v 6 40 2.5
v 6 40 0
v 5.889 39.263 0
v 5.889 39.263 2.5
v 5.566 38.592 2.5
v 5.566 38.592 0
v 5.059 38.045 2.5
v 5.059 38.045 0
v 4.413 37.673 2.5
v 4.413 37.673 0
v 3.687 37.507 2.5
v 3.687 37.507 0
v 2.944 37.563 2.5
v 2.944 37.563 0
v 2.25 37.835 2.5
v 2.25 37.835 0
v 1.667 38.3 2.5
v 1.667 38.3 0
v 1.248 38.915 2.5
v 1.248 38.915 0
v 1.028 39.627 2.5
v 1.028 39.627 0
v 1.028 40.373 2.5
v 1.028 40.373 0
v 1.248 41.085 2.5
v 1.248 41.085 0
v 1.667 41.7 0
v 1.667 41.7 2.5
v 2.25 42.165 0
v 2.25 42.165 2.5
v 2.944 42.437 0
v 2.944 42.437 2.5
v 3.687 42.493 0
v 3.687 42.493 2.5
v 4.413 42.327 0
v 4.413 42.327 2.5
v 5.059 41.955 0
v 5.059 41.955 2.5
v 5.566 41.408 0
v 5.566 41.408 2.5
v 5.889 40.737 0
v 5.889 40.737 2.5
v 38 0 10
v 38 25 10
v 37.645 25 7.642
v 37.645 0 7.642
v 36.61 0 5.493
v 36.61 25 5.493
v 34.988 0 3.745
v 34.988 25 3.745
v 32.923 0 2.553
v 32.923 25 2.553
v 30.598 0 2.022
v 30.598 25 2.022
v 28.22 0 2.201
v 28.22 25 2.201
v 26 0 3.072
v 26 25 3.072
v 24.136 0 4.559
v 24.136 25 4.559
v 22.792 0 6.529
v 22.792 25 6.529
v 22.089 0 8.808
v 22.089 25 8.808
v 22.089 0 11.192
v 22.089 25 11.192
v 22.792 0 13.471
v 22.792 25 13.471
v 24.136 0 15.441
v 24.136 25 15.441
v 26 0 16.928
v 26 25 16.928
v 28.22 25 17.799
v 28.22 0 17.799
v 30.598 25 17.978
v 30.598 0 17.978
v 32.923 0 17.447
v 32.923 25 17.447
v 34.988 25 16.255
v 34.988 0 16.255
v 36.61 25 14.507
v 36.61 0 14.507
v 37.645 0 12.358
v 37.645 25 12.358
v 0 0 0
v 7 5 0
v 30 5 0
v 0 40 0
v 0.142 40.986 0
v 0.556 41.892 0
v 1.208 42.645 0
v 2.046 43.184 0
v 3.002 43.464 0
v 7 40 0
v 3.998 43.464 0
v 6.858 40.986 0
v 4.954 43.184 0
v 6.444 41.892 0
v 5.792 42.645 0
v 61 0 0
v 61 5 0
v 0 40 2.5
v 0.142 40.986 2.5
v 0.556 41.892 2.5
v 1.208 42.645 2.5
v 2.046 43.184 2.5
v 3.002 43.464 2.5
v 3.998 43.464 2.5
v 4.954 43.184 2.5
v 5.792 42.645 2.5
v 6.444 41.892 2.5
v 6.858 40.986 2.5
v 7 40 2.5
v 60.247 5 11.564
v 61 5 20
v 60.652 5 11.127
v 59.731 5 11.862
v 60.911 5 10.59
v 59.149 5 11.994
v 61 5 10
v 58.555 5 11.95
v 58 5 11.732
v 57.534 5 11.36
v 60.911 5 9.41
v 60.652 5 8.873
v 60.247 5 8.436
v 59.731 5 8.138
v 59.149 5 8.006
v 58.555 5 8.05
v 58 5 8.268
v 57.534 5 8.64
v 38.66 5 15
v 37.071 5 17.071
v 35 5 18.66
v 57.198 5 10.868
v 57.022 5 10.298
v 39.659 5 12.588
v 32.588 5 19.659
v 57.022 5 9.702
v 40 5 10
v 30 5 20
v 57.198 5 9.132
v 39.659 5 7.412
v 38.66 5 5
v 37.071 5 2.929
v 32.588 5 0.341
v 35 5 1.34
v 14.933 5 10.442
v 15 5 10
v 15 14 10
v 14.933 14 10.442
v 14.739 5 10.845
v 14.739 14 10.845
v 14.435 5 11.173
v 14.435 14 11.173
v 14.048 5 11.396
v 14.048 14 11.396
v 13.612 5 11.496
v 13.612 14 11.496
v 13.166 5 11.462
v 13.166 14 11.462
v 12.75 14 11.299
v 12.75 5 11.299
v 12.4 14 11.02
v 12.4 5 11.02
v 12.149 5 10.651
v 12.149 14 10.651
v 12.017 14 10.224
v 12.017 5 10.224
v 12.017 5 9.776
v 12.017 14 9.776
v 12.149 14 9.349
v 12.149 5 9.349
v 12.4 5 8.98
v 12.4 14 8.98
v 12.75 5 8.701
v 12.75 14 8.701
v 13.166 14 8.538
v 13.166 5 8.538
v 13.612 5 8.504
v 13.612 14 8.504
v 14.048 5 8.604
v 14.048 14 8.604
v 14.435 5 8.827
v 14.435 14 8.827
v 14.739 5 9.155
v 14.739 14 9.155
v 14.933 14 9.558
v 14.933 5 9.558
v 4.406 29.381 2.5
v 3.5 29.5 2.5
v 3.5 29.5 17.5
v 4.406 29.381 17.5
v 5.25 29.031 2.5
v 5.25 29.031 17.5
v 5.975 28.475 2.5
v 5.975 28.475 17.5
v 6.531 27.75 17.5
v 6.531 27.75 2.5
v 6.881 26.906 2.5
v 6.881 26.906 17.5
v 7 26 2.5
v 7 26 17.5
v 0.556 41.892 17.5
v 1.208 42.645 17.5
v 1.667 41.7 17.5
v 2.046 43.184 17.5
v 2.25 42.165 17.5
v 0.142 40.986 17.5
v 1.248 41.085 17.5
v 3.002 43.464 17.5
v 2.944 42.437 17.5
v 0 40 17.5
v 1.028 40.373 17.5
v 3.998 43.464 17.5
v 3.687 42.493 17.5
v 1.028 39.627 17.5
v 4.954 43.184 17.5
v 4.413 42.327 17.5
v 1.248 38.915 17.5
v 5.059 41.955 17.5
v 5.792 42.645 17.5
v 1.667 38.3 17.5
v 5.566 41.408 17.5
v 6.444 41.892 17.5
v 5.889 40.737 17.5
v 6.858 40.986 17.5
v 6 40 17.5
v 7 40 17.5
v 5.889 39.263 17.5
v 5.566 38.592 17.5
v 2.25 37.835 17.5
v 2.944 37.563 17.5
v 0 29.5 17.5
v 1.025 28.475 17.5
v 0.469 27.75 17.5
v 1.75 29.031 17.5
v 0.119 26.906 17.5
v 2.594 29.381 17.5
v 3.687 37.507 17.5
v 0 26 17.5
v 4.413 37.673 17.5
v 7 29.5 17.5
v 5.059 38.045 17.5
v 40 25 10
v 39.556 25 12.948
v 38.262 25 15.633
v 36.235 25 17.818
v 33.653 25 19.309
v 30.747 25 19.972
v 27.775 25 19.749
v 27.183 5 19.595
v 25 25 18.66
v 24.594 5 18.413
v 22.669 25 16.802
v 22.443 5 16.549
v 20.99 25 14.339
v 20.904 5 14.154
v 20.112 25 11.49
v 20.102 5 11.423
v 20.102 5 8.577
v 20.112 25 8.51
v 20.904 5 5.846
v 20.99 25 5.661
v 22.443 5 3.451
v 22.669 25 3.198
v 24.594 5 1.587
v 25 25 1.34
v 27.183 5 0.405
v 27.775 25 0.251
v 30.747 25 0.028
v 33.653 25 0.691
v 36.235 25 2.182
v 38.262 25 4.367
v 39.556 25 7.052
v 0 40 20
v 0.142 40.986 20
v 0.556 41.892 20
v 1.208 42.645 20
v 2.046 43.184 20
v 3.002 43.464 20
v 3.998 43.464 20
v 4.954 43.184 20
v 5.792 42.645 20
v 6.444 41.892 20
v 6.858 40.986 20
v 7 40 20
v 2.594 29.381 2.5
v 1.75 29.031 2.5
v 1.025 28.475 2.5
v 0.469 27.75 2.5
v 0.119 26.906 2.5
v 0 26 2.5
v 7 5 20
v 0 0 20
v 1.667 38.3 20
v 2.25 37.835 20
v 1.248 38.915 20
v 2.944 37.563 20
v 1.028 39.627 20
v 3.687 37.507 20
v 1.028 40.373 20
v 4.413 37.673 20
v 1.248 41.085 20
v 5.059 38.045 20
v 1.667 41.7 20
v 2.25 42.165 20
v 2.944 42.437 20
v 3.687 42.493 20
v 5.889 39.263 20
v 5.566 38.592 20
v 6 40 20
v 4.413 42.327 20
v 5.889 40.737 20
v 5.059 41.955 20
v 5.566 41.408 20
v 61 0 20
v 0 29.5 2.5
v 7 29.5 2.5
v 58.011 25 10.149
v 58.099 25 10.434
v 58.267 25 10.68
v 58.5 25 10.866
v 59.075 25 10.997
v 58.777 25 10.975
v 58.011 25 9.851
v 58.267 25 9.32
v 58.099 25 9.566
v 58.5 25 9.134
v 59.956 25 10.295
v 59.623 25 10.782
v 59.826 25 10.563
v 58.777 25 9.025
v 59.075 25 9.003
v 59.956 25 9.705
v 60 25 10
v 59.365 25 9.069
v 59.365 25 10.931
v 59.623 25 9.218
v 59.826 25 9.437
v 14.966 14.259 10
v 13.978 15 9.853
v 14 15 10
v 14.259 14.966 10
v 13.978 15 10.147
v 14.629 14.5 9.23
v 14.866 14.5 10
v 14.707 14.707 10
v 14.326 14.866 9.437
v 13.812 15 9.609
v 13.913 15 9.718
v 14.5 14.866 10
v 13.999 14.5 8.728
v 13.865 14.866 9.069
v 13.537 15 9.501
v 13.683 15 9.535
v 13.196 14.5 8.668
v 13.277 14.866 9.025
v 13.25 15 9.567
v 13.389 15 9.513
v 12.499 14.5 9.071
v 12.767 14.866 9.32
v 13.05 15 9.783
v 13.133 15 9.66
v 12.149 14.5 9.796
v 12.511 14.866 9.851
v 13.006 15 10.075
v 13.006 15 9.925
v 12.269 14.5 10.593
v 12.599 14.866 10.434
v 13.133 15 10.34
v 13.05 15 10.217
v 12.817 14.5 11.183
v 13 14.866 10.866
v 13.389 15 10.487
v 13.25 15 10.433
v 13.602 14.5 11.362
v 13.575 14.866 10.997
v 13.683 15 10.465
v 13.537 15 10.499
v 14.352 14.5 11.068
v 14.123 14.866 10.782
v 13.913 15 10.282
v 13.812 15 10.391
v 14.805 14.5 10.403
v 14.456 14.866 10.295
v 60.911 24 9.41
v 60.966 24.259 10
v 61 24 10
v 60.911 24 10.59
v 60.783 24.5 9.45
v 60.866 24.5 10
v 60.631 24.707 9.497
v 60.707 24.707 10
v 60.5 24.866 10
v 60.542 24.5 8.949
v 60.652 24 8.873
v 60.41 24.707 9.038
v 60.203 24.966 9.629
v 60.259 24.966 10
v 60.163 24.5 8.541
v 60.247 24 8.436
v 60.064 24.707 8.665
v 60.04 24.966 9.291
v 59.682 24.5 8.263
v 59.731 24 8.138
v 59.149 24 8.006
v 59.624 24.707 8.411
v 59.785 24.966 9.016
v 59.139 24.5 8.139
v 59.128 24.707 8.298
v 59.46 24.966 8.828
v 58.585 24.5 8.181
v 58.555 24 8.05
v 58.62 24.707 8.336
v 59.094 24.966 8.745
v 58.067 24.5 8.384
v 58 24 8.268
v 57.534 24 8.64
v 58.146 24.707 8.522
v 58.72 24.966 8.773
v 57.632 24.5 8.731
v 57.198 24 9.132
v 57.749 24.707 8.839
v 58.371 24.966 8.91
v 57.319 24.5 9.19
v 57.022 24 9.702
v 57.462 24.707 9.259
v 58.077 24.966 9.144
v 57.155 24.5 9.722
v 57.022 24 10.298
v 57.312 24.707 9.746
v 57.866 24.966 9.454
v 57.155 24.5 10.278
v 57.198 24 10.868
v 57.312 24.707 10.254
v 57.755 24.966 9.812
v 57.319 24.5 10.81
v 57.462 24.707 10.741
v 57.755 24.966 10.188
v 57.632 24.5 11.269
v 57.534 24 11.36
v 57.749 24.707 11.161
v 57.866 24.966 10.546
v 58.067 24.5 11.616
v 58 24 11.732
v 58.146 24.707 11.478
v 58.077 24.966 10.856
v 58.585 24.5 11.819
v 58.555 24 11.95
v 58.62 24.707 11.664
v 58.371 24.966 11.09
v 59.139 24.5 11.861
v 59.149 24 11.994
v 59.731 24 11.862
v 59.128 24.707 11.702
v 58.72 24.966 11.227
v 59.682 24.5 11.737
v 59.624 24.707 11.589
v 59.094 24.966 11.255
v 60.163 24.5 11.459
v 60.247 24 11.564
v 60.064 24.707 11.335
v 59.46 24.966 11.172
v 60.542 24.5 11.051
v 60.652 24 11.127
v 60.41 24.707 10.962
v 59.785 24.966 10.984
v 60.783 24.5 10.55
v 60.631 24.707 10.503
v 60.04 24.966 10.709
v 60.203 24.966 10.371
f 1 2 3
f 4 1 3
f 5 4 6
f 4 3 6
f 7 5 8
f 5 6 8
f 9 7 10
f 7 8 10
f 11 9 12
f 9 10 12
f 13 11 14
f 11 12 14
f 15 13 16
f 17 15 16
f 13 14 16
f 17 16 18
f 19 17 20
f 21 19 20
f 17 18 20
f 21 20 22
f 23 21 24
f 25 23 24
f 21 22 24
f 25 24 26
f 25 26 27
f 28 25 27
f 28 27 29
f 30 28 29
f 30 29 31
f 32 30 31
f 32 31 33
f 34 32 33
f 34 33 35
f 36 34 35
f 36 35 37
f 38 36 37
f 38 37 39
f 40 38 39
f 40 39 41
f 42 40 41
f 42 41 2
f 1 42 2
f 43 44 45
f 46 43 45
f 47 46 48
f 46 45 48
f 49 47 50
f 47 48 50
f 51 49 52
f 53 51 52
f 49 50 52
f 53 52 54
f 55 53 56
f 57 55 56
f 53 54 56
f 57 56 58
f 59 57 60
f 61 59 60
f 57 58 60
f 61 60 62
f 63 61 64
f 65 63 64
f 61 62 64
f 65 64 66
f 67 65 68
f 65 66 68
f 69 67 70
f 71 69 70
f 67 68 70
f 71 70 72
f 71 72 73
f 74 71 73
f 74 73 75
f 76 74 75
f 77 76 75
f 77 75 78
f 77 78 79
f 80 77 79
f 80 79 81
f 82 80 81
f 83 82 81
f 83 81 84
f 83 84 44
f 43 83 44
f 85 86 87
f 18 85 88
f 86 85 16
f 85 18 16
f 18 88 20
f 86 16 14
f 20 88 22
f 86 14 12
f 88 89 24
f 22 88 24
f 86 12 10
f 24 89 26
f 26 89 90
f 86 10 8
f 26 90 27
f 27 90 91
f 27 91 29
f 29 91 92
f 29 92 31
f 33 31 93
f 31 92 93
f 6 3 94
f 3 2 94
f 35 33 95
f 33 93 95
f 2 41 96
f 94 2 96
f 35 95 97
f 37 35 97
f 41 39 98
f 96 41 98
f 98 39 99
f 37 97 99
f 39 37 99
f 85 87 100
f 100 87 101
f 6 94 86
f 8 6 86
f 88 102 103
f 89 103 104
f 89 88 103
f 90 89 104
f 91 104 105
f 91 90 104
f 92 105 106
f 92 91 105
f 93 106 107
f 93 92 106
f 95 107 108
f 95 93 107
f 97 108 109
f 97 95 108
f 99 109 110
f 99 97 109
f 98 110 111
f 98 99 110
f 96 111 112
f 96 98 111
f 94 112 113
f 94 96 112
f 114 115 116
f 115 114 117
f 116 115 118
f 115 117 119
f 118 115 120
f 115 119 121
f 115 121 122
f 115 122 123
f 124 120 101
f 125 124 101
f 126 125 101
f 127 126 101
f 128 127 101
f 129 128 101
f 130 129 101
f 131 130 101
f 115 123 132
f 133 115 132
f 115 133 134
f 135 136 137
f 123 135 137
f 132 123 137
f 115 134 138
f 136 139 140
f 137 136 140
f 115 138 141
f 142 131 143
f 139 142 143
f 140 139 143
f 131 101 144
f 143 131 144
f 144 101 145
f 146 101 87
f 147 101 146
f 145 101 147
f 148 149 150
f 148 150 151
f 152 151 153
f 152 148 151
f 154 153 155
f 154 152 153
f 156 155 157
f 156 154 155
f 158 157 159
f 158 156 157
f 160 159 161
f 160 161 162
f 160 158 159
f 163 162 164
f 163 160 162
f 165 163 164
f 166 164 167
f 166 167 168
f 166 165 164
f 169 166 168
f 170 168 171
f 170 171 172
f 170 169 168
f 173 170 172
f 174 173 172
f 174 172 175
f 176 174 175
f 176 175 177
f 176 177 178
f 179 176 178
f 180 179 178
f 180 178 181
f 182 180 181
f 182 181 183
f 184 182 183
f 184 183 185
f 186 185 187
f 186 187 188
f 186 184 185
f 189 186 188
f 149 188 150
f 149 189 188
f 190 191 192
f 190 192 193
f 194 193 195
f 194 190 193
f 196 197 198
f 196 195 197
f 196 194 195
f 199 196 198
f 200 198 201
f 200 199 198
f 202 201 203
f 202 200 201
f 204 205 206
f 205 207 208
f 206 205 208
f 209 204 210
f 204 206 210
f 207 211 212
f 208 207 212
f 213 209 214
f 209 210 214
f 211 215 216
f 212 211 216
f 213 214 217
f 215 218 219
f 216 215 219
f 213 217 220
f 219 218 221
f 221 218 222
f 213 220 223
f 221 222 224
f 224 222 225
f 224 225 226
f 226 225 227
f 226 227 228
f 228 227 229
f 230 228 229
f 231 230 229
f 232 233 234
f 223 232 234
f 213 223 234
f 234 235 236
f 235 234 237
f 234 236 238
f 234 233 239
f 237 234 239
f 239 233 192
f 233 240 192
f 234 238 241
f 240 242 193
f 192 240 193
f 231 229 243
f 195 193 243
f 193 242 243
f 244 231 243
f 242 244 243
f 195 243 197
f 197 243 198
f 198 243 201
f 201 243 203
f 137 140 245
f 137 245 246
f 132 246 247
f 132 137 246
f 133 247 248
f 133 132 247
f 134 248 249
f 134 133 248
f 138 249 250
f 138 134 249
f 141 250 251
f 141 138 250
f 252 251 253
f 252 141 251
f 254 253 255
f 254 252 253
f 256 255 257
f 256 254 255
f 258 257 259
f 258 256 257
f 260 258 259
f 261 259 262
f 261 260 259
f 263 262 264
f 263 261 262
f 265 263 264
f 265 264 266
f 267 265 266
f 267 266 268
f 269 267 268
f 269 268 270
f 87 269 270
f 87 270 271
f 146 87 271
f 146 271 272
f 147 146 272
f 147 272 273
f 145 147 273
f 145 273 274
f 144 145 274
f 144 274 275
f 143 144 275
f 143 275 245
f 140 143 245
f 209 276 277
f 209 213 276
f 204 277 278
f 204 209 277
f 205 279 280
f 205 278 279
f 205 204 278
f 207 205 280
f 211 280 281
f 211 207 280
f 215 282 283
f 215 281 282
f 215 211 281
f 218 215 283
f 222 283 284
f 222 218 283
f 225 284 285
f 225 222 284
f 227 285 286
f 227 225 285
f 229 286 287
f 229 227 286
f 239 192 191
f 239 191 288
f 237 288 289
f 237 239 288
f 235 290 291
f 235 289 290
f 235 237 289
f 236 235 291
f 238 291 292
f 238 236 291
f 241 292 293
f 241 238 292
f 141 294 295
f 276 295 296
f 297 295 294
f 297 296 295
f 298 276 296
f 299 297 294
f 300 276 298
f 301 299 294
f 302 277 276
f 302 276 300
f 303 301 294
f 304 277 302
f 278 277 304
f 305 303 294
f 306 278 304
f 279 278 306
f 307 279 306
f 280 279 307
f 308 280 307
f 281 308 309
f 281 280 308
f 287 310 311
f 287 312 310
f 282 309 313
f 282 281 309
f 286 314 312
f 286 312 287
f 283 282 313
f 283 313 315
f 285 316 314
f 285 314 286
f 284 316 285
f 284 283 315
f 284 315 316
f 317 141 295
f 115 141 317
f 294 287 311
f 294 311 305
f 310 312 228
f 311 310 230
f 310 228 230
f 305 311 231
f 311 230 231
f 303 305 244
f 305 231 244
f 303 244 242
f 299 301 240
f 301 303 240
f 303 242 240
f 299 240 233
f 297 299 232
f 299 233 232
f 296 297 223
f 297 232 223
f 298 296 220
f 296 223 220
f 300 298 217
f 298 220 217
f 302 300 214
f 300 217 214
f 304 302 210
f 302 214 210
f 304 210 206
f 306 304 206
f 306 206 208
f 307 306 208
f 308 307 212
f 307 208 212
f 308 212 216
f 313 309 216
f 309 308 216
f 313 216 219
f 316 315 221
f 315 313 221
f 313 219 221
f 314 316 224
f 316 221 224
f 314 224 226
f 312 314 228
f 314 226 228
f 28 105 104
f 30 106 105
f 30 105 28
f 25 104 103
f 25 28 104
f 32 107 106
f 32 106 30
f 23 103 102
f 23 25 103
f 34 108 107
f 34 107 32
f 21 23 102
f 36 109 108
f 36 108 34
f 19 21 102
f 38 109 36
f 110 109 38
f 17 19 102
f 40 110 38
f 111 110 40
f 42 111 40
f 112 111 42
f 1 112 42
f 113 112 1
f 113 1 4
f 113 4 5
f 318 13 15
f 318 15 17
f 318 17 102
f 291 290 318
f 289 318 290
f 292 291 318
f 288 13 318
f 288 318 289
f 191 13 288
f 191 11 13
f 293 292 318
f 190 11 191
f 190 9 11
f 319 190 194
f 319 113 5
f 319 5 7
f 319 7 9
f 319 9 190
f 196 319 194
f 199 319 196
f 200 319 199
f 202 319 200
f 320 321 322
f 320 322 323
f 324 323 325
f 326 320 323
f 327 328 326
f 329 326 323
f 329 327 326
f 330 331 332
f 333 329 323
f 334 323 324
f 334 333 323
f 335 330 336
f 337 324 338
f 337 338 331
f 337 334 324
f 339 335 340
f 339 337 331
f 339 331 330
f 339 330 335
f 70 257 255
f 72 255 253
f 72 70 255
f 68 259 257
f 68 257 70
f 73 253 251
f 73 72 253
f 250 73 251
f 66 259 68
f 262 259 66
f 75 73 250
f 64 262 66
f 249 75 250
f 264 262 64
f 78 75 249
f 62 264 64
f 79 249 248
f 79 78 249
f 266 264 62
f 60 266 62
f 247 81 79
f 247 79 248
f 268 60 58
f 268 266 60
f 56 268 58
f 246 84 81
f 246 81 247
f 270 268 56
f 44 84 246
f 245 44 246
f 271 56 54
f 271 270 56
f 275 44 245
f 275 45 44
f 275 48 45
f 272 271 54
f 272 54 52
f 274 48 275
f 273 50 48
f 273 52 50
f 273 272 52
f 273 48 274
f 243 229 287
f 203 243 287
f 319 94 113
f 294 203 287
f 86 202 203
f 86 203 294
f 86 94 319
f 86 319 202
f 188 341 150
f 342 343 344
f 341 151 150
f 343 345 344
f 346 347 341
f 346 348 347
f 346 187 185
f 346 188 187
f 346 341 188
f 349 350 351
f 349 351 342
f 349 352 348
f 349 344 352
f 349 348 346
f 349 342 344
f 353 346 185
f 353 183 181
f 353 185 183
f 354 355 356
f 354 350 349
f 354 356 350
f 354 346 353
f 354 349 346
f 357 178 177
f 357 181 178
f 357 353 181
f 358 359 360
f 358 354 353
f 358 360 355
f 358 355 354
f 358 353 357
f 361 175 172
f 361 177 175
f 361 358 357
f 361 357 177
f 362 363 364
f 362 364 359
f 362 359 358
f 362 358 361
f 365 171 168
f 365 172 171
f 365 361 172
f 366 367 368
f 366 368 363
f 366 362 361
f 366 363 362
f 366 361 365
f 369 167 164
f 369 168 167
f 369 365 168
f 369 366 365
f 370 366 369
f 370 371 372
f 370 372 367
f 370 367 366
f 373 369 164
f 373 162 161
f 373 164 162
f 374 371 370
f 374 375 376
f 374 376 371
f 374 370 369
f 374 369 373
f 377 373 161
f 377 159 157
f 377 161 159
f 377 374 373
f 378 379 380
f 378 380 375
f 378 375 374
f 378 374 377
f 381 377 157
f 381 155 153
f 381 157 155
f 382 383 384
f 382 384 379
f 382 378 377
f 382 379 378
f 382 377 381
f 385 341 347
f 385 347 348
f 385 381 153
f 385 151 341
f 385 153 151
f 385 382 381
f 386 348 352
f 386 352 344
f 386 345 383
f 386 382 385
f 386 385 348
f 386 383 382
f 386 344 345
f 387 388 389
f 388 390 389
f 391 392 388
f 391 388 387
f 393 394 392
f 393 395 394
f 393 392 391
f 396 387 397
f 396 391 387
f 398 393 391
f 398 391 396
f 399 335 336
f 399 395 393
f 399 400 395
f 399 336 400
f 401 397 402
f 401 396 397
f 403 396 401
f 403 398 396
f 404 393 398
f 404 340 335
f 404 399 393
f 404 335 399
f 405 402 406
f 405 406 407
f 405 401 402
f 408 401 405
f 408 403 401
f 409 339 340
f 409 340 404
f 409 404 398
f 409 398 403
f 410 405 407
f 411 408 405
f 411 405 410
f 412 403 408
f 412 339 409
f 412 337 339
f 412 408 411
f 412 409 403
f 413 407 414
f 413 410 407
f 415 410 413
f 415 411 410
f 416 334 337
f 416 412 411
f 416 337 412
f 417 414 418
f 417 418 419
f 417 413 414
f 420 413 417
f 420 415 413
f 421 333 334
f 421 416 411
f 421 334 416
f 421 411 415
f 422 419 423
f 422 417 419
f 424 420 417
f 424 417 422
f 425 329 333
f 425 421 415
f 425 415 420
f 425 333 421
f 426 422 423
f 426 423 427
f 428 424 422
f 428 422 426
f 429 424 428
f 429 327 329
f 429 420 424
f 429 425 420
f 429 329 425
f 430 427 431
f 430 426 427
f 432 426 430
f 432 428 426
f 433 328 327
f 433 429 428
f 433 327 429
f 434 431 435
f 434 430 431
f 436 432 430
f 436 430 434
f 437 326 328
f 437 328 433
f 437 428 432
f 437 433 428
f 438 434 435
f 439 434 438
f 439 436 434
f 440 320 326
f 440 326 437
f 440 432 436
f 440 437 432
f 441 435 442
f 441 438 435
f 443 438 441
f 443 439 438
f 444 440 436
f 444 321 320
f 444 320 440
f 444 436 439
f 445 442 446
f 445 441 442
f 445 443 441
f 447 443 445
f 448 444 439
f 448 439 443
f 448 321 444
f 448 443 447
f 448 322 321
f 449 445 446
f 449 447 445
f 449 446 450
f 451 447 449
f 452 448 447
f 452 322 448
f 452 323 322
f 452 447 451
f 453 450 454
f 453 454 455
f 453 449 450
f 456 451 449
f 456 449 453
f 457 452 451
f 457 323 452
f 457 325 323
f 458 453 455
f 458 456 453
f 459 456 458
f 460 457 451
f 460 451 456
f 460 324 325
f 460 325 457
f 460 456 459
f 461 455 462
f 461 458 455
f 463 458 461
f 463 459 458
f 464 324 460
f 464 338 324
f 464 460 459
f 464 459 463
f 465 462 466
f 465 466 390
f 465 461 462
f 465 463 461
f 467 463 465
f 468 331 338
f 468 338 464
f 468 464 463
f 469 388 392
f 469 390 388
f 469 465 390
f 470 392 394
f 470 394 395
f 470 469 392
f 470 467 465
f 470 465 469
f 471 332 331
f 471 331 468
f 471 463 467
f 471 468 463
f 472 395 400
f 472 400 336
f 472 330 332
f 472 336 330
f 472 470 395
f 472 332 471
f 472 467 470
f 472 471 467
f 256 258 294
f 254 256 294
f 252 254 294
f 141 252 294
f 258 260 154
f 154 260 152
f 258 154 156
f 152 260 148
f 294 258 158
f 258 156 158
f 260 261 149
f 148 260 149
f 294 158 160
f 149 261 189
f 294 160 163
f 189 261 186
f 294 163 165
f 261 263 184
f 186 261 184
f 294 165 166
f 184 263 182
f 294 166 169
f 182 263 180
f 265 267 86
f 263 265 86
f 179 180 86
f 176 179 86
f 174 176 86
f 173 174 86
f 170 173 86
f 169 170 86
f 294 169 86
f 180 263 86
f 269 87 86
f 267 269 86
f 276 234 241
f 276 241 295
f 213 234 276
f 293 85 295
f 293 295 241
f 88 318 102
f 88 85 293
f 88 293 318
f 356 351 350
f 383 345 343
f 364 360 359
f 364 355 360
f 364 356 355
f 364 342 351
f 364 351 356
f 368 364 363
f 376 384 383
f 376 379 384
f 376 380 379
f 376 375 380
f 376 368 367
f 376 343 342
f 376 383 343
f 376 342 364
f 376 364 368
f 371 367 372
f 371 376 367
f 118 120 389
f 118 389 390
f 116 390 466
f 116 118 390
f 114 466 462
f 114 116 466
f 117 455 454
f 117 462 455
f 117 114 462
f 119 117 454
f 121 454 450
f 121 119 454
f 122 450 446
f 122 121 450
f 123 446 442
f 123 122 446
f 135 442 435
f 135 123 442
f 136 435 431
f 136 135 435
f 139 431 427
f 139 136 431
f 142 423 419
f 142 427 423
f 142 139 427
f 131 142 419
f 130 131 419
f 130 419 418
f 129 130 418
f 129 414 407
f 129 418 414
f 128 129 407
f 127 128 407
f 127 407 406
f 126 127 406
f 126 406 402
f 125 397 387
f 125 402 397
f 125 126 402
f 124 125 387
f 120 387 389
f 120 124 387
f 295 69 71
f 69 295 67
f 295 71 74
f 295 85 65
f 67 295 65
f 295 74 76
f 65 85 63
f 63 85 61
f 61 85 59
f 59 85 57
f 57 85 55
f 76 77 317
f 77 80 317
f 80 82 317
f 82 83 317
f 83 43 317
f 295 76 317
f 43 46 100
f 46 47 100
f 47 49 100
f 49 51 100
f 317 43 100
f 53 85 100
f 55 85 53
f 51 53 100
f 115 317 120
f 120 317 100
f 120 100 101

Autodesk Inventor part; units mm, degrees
ref_plane "YZ Plane" through (0, 0, 0) normal (1, 0, 0) x (0, 1, 0)
ref_plane "XZ Plane" through (0, 0, 0) normal (0, 1, 0) x (-1, 0, 0)
ref_plane "XY Plane" through (0, 0, 0) normal (0, 0, 1) x (1, 0, 0)
sketch "Sketch1" plane through (0, 0, 0) normal (0, 0, 1) x (1, 0, 0)
  line L0 (0, 0) -> (0, 40)
  line L1 (0, 0) -> (61, 0)
  line L2 (61, 0) -> (61, 5)
  line L3 (61, 5) -> (7, 5)
  arc A0 (7, 40) -> (0, 40) centre (3.5, 40) ccw
  line L4 (7, 40) -> (7, 5)
  circle A1 centre (3.5, 40) radius 2.5
  dimension "d0" = 40
  dimension "d2" = 5
  dimension "d6" = 3.5
  dimension "d7" = 5
  dimension "d8" = 7
  dimension "d9" = 54
  dimension "d46" = 61
extrude "Extrusion1" add sketch "Sketch1" along normal blind 20
sketch "Sketch2" plane through (7, 5, 0) normal (0, 1, 0) x (1, 0, 0)
  circle A0 centre (6.5, -10) radius 1.5
  line L0 (0, 0) -> (0, -20) projected
  circle A1 centre (23, -10) radius 10
  line L1 (0, 0) -> (54, 0) projected
  circle A2 centre (52, -10) radius 2
  line L2 (54, 0) -> (54, -20) projected
  line L3 (-1, 0) -> (-1, -20) projected
  line L4 (-6, 0) -> (-6, -20) projected
  line L5 (-7, -10) -> (-7, -6.6929)
  point P0 (-7, 0)
  dimension "d12" = 3
  dimension "d13" = 6.5
  dimension "d14" = 20
  dimension "d16" = 23
  dimension "d19" = 10
  dimension "d20" = 4
  dimension "d21" = 10
  dimension "d22" = 17
  dimension "d47" = 31
  dimension "d48" = 59
  dimension "d49" = 30
  dimension "d50" = 13.5
extrude "Extrusion2" add sketch "Sketch2" along normal blind 20
sketch "Sketch4" plane through (0, 0, 20) normal (0, 0, 1) x (1, 0, 0)
  line L0 (15, 25) -> (12, 25) projected
  line L1 (12, 25) -> (15, 25)
  line L2 (15, 5) -> (15, 25) projected
  line L3 (15, 25) -> (15, 15)
  line L4 (15, 15) -> (12, 15)
  line L5 (12, 5) -> (12, 25) projected
  point P0 (0, 0)
  dimension "d25" = 10
extrude "Extrusion3" cut sketch "Sketch4" against normal blind 20
fillet "Fillet1" radius 1 1 edges at (12, 15, 10)
fillet "Fillet2" radius 1 1 edges at (57, 25, 10)
sketch "Sketch5" plane through (30, 25, 10) normal (0, 1, 0) x (1, 0, 0)
  circle A0 centre (0, 0) radius 8
  point P0 (-30, 10)
  dimension "d30" = 16
extrude "Extrusion4" cut sketch "Sketch5" against normal blind 30
sketch "Sketch6" plane through (7, 5, 0) normal (1, 0, 0) x (0, 0, -1)
  point P0 (0, -5)
sketch "Sketch7" plane through (7, 5, 0) normal (1, 0, 0) x (0, 0, -1)
  line L0 (-10, 41.0364) -> (-10, 39.6436)
  line L1 (0, 38.5) -> (-20, 38.5) projected
  line L2 (-2.5, 38.5) -> (-2.5, 24.5)
  line L3 (-17.5, 38.5) -> (-17.5, 24.5)
  line L4 (-17.5, 38.5) -> (-2.5, 38.5)
  line L5 (0, 32.5) -> (-20, 32.5) projected
  line L6 (-17.5, 24.5) -> (-2.5, 24.5)
  point P0 (0, -5)
  dimension "d12" = 3
  dimension "d40" = 14
  dimension "d41" = 14
  dimension "d42" = 15
extrude "Extrusion5" cut sketch "Sketch7" against normal blind 14
sketch "Sketch8" plane through (30, 5, 0) normal (0, 1, 0) x (1, 0, 0)
  point P0 (-30, 0)
fillet "Fillet4" radius 3.5 2 edges at (7, 29.5, 10) (0, 29.5, 10)
equation "\"d19\" = 0.5 * d14"
equation "\"d21\" = d19"
equation "\"d40\" = d41"
properties part number "ValveBaseMk2.1"
